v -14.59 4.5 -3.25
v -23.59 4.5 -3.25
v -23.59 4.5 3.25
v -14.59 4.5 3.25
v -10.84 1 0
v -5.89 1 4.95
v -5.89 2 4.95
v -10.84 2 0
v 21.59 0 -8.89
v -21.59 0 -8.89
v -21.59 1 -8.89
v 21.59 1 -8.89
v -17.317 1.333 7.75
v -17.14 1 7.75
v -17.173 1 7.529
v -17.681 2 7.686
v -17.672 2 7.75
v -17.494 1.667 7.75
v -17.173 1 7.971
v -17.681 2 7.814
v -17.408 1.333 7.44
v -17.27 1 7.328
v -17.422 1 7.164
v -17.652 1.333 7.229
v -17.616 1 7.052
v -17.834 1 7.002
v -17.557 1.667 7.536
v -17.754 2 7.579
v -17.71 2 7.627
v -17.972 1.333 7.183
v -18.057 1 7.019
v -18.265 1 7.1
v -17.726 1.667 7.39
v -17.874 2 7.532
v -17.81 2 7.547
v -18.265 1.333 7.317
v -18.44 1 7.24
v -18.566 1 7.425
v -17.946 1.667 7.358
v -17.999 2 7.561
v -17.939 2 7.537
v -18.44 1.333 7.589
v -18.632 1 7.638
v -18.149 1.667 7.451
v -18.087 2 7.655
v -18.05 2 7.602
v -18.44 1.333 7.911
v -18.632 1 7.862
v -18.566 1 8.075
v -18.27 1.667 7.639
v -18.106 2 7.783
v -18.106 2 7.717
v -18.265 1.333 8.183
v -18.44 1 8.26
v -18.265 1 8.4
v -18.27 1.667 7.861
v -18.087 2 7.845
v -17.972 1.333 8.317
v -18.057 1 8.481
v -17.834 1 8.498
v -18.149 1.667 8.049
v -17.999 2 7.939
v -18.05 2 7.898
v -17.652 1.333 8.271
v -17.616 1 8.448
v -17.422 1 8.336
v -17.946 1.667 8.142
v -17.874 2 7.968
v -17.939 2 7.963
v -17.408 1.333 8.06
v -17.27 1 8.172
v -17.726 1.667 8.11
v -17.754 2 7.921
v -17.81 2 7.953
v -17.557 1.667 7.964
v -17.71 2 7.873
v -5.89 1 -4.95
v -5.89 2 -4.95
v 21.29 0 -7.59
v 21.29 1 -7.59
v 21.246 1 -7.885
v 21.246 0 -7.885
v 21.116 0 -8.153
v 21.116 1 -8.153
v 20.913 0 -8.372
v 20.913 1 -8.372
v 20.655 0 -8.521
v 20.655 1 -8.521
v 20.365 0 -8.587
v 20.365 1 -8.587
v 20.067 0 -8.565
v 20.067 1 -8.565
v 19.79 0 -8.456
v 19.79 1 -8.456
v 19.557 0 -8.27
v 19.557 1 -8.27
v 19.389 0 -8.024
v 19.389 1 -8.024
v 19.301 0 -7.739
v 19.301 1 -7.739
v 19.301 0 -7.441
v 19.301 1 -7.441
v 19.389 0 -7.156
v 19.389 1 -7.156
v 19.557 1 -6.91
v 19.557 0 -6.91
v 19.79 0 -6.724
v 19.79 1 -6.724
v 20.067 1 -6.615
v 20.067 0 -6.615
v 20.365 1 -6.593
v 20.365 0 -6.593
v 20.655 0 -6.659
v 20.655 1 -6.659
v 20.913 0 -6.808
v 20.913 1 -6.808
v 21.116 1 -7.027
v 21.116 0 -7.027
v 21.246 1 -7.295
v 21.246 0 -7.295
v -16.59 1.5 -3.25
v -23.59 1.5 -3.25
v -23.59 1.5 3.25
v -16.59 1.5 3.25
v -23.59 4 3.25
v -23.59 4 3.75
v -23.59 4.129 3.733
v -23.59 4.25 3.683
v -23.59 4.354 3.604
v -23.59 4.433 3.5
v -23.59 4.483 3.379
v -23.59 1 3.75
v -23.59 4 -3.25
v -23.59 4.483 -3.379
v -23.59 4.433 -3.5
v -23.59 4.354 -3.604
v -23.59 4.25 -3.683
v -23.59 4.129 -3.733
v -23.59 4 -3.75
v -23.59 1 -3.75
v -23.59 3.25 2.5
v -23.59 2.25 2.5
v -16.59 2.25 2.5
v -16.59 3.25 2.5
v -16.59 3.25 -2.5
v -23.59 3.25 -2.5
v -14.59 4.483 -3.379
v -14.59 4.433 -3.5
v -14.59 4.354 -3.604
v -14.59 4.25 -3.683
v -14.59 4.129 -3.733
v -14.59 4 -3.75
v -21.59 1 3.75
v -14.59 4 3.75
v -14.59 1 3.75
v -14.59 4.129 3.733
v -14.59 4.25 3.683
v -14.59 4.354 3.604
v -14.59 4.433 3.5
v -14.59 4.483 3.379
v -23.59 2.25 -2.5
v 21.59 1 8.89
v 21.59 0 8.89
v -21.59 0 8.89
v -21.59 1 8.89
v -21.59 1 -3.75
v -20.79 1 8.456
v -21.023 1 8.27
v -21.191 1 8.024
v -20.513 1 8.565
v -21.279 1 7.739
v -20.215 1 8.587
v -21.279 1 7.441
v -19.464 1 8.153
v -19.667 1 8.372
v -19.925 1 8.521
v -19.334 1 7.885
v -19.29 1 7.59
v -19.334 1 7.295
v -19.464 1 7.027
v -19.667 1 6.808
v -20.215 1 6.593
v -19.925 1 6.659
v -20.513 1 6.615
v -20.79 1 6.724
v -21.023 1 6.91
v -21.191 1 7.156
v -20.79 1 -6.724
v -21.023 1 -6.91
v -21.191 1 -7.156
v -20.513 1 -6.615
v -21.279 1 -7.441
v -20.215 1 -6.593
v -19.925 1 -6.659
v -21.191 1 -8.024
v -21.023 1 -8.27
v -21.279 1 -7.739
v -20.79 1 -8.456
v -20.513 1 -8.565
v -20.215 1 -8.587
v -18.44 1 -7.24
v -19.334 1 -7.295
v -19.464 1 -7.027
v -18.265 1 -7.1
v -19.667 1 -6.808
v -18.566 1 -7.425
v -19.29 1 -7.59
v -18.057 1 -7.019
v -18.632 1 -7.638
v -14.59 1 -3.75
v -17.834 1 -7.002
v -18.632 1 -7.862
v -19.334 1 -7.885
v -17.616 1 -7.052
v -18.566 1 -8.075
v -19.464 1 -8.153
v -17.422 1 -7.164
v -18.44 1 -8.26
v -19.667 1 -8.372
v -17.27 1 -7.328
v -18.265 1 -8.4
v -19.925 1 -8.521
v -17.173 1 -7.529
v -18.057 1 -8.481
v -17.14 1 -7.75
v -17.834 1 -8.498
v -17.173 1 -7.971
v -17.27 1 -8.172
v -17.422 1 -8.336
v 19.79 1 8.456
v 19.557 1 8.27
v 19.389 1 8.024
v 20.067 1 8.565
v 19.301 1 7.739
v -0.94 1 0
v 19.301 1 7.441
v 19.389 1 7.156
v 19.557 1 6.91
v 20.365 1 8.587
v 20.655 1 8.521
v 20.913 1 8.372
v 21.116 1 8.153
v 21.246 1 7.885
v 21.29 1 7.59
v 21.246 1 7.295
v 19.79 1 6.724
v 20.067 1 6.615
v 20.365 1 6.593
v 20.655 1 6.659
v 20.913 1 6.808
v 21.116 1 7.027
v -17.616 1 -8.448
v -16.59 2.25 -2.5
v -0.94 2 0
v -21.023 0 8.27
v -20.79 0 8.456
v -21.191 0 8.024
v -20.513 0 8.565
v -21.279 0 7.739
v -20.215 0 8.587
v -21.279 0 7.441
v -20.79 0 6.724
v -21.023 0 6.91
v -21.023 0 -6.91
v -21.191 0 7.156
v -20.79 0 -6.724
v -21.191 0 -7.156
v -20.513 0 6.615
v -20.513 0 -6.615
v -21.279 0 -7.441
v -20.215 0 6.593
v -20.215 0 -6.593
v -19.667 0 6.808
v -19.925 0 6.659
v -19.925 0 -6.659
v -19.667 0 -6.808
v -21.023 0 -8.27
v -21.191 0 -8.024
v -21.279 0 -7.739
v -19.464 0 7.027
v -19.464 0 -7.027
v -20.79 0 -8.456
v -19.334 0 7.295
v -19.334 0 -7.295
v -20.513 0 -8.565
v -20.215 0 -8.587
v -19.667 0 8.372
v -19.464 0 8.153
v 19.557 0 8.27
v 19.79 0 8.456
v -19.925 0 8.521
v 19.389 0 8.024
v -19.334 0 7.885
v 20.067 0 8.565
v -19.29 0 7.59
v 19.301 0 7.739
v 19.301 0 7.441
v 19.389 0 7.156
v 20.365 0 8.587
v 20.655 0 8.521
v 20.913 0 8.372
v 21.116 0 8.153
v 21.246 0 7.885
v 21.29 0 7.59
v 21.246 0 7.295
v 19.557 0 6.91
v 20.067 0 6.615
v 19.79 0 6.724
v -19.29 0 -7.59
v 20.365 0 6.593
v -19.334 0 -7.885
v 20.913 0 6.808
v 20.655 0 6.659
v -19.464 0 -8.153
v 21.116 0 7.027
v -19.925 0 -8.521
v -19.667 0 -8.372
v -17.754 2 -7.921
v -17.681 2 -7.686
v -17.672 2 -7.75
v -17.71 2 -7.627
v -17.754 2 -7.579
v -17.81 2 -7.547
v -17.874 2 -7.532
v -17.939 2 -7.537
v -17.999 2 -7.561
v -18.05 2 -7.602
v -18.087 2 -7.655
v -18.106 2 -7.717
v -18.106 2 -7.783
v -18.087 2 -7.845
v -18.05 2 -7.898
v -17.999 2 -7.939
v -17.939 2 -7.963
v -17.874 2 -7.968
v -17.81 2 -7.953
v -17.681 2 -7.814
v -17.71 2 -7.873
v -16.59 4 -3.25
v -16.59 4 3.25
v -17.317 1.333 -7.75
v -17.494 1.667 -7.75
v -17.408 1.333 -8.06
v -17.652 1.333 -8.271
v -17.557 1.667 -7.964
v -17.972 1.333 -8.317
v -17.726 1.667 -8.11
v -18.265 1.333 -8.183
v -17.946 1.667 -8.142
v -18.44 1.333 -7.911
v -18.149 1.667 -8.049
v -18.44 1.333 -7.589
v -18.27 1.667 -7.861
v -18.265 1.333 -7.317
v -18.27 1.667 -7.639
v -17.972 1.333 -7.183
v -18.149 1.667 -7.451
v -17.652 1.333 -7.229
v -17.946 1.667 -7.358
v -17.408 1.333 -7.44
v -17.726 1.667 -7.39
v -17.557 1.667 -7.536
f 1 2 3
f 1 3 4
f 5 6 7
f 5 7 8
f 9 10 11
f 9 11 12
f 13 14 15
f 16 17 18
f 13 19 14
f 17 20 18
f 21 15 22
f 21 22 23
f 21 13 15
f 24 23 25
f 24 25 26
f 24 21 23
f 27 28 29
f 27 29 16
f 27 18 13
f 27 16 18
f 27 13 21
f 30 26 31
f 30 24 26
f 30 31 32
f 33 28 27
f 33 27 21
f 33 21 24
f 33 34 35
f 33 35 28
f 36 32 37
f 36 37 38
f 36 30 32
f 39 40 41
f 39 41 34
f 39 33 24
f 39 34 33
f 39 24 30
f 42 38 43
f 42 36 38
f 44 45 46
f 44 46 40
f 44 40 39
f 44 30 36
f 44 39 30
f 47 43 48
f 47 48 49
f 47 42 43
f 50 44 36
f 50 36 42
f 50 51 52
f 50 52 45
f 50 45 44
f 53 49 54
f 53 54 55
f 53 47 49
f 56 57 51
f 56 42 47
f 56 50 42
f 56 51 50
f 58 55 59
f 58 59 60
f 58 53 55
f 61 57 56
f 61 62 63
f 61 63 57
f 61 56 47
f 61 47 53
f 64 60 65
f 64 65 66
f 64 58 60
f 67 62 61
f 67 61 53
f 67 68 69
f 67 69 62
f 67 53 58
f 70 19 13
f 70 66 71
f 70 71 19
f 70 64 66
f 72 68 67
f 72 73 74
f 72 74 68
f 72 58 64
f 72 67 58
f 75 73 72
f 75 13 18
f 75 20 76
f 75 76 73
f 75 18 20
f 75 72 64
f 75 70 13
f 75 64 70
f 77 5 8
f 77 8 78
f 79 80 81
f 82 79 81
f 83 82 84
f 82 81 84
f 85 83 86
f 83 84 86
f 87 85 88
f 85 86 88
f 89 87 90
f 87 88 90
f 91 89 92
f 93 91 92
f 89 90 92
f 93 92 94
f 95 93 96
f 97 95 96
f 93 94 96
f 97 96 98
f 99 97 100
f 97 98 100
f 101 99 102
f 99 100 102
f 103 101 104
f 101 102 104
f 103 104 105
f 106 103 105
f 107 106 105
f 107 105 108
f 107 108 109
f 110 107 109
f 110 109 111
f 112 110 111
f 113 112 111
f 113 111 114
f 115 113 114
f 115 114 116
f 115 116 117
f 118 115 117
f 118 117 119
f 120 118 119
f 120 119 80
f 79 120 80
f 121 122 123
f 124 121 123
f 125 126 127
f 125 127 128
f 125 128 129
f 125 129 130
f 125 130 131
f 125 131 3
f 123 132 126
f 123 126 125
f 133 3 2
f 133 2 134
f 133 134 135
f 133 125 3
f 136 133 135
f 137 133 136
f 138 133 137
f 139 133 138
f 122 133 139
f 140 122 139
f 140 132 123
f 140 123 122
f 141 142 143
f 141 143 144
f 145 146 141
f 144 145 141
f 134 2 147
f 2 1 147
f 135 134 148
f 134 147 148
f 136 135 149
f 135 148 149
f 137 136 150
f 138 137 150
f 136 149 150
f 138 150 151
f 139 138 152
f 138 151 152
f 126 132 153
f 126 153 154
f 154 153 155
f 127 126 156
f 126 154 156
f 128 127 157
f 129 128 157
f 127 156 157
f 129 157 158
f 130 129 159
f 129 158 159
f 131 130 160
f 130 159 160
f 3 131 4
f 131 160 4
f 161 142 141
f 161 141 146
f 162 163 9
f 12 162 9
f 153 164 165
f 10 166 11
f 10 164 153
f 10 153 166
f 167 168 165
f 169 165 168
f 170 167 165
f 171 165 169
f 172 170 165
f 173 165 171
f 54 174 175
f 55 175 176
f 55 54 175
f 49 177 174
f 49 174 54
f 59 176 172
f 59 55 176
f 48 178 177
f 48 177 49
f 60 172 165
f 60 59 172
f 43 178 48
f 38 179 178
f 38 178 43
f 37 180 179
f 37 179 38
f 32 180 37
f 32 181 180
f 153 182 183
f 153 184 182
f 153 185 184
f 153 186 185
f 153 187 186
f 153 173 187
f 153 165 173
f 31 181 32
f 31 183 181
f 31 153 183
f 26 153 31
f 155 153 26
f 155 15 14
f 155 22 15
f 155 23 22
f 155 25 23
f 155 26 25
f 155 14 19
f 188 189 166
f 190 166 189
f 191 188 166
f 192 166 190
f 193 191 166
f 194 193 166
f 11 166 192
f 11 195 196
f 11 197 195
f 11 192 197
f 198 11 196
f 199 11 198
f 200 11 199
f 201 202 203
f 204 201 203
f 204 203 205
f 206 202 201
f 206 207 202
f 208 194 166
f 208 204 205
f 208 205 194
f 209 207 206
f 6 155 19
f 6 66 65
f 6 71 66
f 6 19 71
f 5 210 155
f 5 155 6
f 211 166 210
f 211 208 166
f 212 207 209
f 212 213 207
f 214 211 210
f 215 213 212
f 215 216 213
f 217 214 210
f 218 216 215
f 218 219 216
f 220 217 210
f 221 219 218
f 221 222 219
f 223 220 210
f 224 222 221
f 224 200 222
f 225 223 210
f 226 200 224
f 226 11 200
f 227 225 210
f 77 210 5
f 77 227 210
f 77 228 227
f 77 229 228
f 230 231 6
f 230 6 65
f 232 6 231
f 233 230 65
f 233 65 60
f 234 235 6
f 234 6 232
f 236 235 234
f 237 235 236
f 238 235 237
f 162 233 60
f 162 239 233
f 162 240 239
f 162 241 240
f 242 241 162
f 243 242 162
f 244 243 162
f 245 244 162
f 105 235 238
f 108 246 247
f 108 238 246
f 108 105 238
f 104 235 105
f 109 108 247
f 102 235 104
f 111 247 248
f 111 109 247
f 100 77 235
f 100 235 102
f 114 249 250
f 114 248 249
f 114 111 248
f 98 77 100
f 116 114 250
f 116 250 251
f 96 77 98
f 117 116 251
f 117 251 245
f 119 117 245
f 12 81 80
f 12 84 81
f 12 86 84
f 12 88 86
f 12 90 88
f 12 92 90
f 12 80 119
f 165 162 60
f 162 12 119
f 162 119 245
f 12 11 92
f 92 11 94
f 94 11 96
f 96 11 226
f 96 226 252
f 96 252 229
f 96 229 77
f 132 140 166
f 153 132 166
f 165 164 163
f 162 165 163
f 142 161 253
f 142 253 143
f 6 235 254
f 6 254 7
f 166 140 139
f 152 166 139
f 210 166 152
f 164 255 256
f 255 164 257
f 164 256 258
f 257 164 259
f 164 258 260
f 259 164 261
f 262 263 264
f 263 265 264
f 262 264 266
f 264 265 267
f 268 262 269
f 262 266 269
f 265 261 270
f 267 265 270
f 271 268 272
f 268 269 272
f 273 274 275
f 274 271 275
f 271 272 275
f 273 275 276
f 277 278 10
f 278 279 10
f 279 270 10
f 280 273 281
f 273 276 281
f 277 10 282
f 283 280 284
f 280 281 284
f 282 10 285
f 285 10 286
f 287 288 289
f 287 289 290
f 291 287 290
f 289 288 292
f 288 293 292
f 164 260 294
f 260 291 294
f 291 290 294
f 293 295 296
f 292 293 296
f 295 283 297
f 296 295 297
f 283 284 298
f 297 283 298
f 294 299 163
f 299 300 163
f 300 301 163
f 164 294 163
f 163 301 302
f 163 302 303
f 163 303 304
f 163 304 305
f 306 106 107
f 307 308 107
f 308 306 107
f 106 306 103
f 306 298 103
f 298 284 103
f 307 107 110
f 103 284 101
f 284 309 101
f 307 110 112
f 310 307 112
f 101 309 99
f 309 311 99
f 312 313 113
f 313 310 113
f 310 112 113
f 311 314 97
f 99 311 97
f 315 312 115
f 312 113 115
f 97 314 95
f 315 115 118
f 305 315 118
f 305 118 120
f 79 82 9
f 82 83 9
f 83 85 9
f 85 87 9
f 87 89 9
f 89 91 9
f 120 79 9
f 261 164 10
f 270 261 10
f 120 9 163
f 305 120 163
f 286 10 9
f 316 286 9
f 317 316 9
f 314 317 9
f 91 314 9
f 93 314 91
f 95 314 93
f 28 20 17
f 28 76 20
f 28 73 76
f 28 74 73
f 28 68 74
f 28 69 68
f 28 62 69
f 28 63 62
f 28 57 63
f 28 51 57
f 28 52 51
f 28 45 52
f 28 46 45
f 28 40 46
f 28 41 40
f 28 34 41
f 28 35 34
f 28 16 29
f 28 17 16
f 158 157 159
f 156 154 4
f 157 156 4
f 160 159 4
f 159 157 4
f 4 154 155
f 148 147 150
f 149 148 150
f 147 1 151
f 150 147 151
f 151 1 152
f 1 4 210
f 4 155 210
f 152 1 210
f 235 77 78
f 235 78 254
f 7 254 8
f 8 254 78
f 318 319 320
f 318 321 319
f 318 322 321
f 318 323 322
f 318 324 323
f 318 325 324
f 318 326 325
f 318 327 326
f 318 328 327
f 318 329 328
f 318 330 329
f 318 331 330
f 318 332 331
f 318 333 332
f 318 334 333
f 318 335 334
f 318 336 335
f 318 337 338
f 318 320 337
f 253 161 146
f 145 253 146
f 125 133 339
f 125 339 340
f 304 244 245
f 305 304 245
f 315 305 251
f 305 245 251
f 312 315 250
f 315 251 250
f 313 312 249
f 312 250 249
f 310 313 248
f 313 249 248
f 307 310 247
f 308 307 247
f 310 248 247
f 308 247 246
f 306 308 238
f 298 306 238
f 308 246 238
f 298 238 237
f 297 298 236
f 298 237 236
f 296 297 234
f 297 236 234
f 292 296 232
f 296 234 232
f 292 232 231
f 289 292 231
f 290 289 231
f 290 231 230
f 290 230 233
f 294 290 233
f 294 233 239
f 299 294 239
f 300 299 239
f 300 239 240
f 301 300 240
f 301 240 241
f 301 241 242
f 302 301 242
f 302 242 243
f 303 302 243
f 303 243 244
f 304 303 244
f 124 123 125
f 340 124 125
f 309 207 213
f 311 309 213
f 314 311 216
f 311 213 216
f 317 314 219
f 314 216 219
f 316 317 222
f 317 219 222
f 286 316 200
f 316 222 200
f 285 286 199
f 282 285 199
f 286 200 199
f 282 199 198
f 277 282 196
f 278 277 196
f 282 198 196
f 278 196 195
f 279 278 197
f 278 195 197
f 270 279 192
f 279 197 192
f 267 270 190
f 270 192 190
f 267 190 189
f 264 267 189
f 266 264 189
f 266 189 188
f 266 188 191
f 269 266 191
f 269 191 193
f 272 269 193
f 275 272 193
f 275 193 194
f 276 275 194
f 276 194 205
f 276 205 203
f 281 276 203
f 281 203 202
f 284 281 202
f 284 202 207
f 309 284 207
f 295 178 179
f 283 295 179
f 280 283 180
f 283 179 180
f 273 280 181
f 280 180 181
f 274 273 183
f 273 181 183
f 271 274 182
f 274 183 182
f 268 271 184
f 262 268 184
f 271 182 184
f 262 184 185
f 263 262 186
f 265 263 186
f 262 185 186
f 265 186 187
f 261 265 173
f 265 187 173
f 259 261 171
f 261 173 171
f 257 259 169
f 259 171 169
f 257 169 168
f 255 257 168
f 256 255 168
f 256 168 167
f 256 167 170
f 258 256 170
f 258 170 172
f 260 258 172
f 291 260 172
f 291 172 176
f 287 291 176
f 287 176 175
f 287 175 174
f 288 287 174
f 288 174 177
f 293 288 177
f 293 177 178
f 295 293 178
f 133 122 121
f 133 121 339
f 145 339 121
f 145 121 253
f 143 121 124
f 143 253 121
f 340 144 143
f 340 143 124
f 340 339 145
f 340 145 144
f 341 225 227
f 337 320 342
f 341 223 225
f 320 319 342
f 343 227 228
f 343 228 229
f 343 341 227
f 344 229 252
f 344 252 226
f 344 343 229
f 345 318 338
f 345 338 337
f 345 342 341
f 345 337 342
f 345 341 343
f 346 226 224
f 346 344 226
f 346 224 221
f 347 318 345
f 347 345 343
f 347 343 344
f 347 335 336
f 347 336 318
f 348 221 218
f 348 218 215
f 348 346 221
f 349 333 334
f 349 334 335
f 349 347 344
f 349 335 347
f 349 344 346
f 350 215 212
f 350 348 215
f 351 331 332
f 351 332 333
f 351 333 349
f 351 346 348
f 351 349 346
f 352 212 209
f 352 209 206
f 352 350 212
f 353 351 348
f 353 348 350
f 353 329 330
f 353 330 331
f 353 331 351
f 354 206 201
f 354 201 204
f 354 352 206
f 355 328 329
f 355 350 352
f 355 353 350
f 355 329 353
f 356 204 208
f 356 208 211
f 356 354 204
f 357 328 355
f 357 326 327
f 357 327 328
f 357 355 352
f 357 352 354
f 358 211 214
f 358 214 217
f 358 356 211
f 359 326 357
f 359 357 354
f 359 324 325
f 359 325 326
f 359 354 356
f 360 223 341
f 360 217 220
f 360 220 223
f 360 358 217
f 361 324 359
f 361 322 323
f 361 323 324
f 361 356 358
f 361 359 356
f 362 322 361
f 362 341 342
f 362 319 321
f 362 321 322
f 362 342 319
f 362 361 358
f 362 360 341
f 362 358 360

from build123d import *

# Parameters (mm, degrees)
ESBO_O1_W                          = 43.18
ESBO_O1_H                          = 17.78
RESSALTO_EXTRUS_O1_DEPTH           = 1
ESBO_O5_R                          = 0.75
RESSALTO_EXTRUS_O5_DEPTH           = 1
RESSALTO_EXTRUS_O5_DRAFT           = 28
RESSALTO_EXTRUS_O5_PROFILE_2_DEPTH = 1
RESSALTO_EXTRUS_O5_PROFILE_2_DRAFT = 28
RESSALTO_EXTRUS_O4_DEPTH           = 1
ESBO_O6_W                          = 9
ESBO_O6_H                          = 7.5
RESSALTO_EXTRUS_O6_DEPTH           = 3.5
ESBO_O7_R                          = 1
CORTE_EXTRUS_O1_DEPTH              = 26.451330024
ESBO_O8_W                          = 6.5
ESBO_O8_H                          = 2.5
ESBO_O8_W_2                        = 5
ESBO_O8_H_2                        = 1
CORTE_EXTRUS_O2_DEPTH              = 7
FILETE1_R                          = 0.5


with BuildPart() as part:
    # Esboço1 → Ressalto-extrusão1 (new body)
    with BuildSketch(Plane(origin=(0, 0, 0), x_dir=(1, 0, 0), z_dir=(0, 1, 0))):
        Rectangle(ESBO_O1_W, ESBO_O1_H)
    extrude(amount=RESSALTO_EXTRUS_O1_DEPTH)


with BuildPart() as ressalto_extrus_o5_tool:
    # Esboço5 → Ressalto-extrusão5 (with draft: the straight prism first)
    with BuildSketch(Plane(origin=(0, 1, 0), x_dir=(1, 0, 0), z_dir=(0, 1, 0))):
        with Locations((-17.89, 7.75)):
            Circle(ESBO_O5_R)
    extrude(amount=RESSALTO_EXTRUS_O5_DEPTH)
    # Ressalto-extrusão5: the draft: its side faces are tilted about the plane it starts from
    ressalto_extrus_o5_sides = [ressalto_extrus_o5_tool.faces().sort_by_distance(p)[0] for p in [
        (-18.64, 1.5, -7.75),
    ]]
    draft(ressalto_extrus_o5_sides, Plane(origin=(0, 1, 0), x_dir=(1, 0, 0), z_dir=(0, 1, 0)), RESSALTO_EXTRUS_O5_DRAFT)


with BuildPart() as part_1:
    add(part.part)

    # Ressalto-extrusão5: add ressalto_extrus_o5_tool
    add(ressalto_extrus_o5_tool.part)


with BuildPart() as ressalto_extrus_o5_profile_2_tool:
    # Esboço5 → Ressalto-extrusão5 profile 2 (with draft: the straight prism first)
    with BuildSketch(Plane(origin=(0, 1, 0), x_dir=(1, 0, 0), z_dir=(0, 1, 0))):
        with Locations((-17.89, -7.75)):
            Circle(ESBO_O5_R)
    extrude(amount=RESSALTO_EXTRUS_O5_PROFILE_2_DEPTH)
    # Ressalto-extrusão5 profile 2: the draft: its side faces are tilted about the plane it starts from
    ressalto_extrus_o5_profile_2_sides = [ressalto_extrus_o5_profile_2_tool.faces().sort_by_distance(p)[0] for p in [
        (-18.64, 1.5, 7.75),
    ]]
    draft(ressalto_extrus_o5_profile_2_sides, Plane(origin=(0, 1, 0), x_dir=(1, 0, 0), z_dir=(0, 1, 0)), RESSALTO_EXTRUS_O5_PROFILE_2_DRAFT)


with BuildPart() as part_2:
    add(part_1.part)

    # Ressalto-extrusão5 profile 2: add ressalto_extrus_o5_profile_2_tool
    add(ressalto_extrus_o5_profile_2_tool.part)

    # Esboço4 → Ressalto-extrusão4 (add)
    with BuildSketch(Plane(origin=(0, 1, 0), x_dir=(1, 0, 0), z_dir=(0, 1, 0))):
        Polygon((-10.839747468, 0), (-5.89, 4.949747468), (-0.940252532, 0), (-5.89, -4.949747468), align=None)
    extrude(amount=RESSALTO_EXTRUS_O4_DEPTH)

    # Esboço6 → Ressalto-extrusão6 (add)
    with BuildSketch(Plane(origin=(0, 1, 0), x_dir=(1, 0, 0), z_dir=(0, 1, 0))):
        with Locations((-19.09, 0)):
            Rectangle(ESBO_O6_W, ESBO_O6_H)
    extrude(amount=RESSALTO_EXTRUS_O6_DEPTH)

    # Esboço7 → Corte-extrusão1 (cut, through all)
    with BuildSketch(Plane(origin=(0, 1, 0), x_dir=(1, 0, 0), z_dir=(0, 1, 0))):
        with Locations((-20.29, 7.59)):
            Circle(ESBO_O7_R)
        with Locations((-20.29, -7.59)):
            Circle(ESBO_O7_R)
        with Locations((20.29, -7.59)):
            Circle(ESBO_O7_R)
        with Locations((20.29, 7.59)):
            Circle(ESBO_O7_R)
    extrude(amount=-CORTE_EXTRUS_O1_DEPTH, mode=Mode.SUBTRACT)

    # Esboço8 → Corte-extrusão2 (cut)
    with BuildSketch(Plane.ZY.offset(23.59)):
        with Locations((0, 2.75)):
            Rectangle(ESBO_O8_W, ESBO_O8_H)
        with Locations((0, 2.75)):
            Rectangle(ESBO_O8_W_2, ESBO_O8_H_2, mode=Mode.SUBTRACT)
    extrude(amount=-CORTE_EXTRUS_O2_DEPTH, mode=Mode.SUBTRACT)

    # Filete1
    filete1_edges = [part_2.edges().sort_by_distance(p)[0] for p in [
        (-19.09, 4.5, -3.75),
        (-19.09, 4.5, 3.75),
    ]]
    fillet(filete1_edges, radius=FILETE1_R)


solid = part_2.part
